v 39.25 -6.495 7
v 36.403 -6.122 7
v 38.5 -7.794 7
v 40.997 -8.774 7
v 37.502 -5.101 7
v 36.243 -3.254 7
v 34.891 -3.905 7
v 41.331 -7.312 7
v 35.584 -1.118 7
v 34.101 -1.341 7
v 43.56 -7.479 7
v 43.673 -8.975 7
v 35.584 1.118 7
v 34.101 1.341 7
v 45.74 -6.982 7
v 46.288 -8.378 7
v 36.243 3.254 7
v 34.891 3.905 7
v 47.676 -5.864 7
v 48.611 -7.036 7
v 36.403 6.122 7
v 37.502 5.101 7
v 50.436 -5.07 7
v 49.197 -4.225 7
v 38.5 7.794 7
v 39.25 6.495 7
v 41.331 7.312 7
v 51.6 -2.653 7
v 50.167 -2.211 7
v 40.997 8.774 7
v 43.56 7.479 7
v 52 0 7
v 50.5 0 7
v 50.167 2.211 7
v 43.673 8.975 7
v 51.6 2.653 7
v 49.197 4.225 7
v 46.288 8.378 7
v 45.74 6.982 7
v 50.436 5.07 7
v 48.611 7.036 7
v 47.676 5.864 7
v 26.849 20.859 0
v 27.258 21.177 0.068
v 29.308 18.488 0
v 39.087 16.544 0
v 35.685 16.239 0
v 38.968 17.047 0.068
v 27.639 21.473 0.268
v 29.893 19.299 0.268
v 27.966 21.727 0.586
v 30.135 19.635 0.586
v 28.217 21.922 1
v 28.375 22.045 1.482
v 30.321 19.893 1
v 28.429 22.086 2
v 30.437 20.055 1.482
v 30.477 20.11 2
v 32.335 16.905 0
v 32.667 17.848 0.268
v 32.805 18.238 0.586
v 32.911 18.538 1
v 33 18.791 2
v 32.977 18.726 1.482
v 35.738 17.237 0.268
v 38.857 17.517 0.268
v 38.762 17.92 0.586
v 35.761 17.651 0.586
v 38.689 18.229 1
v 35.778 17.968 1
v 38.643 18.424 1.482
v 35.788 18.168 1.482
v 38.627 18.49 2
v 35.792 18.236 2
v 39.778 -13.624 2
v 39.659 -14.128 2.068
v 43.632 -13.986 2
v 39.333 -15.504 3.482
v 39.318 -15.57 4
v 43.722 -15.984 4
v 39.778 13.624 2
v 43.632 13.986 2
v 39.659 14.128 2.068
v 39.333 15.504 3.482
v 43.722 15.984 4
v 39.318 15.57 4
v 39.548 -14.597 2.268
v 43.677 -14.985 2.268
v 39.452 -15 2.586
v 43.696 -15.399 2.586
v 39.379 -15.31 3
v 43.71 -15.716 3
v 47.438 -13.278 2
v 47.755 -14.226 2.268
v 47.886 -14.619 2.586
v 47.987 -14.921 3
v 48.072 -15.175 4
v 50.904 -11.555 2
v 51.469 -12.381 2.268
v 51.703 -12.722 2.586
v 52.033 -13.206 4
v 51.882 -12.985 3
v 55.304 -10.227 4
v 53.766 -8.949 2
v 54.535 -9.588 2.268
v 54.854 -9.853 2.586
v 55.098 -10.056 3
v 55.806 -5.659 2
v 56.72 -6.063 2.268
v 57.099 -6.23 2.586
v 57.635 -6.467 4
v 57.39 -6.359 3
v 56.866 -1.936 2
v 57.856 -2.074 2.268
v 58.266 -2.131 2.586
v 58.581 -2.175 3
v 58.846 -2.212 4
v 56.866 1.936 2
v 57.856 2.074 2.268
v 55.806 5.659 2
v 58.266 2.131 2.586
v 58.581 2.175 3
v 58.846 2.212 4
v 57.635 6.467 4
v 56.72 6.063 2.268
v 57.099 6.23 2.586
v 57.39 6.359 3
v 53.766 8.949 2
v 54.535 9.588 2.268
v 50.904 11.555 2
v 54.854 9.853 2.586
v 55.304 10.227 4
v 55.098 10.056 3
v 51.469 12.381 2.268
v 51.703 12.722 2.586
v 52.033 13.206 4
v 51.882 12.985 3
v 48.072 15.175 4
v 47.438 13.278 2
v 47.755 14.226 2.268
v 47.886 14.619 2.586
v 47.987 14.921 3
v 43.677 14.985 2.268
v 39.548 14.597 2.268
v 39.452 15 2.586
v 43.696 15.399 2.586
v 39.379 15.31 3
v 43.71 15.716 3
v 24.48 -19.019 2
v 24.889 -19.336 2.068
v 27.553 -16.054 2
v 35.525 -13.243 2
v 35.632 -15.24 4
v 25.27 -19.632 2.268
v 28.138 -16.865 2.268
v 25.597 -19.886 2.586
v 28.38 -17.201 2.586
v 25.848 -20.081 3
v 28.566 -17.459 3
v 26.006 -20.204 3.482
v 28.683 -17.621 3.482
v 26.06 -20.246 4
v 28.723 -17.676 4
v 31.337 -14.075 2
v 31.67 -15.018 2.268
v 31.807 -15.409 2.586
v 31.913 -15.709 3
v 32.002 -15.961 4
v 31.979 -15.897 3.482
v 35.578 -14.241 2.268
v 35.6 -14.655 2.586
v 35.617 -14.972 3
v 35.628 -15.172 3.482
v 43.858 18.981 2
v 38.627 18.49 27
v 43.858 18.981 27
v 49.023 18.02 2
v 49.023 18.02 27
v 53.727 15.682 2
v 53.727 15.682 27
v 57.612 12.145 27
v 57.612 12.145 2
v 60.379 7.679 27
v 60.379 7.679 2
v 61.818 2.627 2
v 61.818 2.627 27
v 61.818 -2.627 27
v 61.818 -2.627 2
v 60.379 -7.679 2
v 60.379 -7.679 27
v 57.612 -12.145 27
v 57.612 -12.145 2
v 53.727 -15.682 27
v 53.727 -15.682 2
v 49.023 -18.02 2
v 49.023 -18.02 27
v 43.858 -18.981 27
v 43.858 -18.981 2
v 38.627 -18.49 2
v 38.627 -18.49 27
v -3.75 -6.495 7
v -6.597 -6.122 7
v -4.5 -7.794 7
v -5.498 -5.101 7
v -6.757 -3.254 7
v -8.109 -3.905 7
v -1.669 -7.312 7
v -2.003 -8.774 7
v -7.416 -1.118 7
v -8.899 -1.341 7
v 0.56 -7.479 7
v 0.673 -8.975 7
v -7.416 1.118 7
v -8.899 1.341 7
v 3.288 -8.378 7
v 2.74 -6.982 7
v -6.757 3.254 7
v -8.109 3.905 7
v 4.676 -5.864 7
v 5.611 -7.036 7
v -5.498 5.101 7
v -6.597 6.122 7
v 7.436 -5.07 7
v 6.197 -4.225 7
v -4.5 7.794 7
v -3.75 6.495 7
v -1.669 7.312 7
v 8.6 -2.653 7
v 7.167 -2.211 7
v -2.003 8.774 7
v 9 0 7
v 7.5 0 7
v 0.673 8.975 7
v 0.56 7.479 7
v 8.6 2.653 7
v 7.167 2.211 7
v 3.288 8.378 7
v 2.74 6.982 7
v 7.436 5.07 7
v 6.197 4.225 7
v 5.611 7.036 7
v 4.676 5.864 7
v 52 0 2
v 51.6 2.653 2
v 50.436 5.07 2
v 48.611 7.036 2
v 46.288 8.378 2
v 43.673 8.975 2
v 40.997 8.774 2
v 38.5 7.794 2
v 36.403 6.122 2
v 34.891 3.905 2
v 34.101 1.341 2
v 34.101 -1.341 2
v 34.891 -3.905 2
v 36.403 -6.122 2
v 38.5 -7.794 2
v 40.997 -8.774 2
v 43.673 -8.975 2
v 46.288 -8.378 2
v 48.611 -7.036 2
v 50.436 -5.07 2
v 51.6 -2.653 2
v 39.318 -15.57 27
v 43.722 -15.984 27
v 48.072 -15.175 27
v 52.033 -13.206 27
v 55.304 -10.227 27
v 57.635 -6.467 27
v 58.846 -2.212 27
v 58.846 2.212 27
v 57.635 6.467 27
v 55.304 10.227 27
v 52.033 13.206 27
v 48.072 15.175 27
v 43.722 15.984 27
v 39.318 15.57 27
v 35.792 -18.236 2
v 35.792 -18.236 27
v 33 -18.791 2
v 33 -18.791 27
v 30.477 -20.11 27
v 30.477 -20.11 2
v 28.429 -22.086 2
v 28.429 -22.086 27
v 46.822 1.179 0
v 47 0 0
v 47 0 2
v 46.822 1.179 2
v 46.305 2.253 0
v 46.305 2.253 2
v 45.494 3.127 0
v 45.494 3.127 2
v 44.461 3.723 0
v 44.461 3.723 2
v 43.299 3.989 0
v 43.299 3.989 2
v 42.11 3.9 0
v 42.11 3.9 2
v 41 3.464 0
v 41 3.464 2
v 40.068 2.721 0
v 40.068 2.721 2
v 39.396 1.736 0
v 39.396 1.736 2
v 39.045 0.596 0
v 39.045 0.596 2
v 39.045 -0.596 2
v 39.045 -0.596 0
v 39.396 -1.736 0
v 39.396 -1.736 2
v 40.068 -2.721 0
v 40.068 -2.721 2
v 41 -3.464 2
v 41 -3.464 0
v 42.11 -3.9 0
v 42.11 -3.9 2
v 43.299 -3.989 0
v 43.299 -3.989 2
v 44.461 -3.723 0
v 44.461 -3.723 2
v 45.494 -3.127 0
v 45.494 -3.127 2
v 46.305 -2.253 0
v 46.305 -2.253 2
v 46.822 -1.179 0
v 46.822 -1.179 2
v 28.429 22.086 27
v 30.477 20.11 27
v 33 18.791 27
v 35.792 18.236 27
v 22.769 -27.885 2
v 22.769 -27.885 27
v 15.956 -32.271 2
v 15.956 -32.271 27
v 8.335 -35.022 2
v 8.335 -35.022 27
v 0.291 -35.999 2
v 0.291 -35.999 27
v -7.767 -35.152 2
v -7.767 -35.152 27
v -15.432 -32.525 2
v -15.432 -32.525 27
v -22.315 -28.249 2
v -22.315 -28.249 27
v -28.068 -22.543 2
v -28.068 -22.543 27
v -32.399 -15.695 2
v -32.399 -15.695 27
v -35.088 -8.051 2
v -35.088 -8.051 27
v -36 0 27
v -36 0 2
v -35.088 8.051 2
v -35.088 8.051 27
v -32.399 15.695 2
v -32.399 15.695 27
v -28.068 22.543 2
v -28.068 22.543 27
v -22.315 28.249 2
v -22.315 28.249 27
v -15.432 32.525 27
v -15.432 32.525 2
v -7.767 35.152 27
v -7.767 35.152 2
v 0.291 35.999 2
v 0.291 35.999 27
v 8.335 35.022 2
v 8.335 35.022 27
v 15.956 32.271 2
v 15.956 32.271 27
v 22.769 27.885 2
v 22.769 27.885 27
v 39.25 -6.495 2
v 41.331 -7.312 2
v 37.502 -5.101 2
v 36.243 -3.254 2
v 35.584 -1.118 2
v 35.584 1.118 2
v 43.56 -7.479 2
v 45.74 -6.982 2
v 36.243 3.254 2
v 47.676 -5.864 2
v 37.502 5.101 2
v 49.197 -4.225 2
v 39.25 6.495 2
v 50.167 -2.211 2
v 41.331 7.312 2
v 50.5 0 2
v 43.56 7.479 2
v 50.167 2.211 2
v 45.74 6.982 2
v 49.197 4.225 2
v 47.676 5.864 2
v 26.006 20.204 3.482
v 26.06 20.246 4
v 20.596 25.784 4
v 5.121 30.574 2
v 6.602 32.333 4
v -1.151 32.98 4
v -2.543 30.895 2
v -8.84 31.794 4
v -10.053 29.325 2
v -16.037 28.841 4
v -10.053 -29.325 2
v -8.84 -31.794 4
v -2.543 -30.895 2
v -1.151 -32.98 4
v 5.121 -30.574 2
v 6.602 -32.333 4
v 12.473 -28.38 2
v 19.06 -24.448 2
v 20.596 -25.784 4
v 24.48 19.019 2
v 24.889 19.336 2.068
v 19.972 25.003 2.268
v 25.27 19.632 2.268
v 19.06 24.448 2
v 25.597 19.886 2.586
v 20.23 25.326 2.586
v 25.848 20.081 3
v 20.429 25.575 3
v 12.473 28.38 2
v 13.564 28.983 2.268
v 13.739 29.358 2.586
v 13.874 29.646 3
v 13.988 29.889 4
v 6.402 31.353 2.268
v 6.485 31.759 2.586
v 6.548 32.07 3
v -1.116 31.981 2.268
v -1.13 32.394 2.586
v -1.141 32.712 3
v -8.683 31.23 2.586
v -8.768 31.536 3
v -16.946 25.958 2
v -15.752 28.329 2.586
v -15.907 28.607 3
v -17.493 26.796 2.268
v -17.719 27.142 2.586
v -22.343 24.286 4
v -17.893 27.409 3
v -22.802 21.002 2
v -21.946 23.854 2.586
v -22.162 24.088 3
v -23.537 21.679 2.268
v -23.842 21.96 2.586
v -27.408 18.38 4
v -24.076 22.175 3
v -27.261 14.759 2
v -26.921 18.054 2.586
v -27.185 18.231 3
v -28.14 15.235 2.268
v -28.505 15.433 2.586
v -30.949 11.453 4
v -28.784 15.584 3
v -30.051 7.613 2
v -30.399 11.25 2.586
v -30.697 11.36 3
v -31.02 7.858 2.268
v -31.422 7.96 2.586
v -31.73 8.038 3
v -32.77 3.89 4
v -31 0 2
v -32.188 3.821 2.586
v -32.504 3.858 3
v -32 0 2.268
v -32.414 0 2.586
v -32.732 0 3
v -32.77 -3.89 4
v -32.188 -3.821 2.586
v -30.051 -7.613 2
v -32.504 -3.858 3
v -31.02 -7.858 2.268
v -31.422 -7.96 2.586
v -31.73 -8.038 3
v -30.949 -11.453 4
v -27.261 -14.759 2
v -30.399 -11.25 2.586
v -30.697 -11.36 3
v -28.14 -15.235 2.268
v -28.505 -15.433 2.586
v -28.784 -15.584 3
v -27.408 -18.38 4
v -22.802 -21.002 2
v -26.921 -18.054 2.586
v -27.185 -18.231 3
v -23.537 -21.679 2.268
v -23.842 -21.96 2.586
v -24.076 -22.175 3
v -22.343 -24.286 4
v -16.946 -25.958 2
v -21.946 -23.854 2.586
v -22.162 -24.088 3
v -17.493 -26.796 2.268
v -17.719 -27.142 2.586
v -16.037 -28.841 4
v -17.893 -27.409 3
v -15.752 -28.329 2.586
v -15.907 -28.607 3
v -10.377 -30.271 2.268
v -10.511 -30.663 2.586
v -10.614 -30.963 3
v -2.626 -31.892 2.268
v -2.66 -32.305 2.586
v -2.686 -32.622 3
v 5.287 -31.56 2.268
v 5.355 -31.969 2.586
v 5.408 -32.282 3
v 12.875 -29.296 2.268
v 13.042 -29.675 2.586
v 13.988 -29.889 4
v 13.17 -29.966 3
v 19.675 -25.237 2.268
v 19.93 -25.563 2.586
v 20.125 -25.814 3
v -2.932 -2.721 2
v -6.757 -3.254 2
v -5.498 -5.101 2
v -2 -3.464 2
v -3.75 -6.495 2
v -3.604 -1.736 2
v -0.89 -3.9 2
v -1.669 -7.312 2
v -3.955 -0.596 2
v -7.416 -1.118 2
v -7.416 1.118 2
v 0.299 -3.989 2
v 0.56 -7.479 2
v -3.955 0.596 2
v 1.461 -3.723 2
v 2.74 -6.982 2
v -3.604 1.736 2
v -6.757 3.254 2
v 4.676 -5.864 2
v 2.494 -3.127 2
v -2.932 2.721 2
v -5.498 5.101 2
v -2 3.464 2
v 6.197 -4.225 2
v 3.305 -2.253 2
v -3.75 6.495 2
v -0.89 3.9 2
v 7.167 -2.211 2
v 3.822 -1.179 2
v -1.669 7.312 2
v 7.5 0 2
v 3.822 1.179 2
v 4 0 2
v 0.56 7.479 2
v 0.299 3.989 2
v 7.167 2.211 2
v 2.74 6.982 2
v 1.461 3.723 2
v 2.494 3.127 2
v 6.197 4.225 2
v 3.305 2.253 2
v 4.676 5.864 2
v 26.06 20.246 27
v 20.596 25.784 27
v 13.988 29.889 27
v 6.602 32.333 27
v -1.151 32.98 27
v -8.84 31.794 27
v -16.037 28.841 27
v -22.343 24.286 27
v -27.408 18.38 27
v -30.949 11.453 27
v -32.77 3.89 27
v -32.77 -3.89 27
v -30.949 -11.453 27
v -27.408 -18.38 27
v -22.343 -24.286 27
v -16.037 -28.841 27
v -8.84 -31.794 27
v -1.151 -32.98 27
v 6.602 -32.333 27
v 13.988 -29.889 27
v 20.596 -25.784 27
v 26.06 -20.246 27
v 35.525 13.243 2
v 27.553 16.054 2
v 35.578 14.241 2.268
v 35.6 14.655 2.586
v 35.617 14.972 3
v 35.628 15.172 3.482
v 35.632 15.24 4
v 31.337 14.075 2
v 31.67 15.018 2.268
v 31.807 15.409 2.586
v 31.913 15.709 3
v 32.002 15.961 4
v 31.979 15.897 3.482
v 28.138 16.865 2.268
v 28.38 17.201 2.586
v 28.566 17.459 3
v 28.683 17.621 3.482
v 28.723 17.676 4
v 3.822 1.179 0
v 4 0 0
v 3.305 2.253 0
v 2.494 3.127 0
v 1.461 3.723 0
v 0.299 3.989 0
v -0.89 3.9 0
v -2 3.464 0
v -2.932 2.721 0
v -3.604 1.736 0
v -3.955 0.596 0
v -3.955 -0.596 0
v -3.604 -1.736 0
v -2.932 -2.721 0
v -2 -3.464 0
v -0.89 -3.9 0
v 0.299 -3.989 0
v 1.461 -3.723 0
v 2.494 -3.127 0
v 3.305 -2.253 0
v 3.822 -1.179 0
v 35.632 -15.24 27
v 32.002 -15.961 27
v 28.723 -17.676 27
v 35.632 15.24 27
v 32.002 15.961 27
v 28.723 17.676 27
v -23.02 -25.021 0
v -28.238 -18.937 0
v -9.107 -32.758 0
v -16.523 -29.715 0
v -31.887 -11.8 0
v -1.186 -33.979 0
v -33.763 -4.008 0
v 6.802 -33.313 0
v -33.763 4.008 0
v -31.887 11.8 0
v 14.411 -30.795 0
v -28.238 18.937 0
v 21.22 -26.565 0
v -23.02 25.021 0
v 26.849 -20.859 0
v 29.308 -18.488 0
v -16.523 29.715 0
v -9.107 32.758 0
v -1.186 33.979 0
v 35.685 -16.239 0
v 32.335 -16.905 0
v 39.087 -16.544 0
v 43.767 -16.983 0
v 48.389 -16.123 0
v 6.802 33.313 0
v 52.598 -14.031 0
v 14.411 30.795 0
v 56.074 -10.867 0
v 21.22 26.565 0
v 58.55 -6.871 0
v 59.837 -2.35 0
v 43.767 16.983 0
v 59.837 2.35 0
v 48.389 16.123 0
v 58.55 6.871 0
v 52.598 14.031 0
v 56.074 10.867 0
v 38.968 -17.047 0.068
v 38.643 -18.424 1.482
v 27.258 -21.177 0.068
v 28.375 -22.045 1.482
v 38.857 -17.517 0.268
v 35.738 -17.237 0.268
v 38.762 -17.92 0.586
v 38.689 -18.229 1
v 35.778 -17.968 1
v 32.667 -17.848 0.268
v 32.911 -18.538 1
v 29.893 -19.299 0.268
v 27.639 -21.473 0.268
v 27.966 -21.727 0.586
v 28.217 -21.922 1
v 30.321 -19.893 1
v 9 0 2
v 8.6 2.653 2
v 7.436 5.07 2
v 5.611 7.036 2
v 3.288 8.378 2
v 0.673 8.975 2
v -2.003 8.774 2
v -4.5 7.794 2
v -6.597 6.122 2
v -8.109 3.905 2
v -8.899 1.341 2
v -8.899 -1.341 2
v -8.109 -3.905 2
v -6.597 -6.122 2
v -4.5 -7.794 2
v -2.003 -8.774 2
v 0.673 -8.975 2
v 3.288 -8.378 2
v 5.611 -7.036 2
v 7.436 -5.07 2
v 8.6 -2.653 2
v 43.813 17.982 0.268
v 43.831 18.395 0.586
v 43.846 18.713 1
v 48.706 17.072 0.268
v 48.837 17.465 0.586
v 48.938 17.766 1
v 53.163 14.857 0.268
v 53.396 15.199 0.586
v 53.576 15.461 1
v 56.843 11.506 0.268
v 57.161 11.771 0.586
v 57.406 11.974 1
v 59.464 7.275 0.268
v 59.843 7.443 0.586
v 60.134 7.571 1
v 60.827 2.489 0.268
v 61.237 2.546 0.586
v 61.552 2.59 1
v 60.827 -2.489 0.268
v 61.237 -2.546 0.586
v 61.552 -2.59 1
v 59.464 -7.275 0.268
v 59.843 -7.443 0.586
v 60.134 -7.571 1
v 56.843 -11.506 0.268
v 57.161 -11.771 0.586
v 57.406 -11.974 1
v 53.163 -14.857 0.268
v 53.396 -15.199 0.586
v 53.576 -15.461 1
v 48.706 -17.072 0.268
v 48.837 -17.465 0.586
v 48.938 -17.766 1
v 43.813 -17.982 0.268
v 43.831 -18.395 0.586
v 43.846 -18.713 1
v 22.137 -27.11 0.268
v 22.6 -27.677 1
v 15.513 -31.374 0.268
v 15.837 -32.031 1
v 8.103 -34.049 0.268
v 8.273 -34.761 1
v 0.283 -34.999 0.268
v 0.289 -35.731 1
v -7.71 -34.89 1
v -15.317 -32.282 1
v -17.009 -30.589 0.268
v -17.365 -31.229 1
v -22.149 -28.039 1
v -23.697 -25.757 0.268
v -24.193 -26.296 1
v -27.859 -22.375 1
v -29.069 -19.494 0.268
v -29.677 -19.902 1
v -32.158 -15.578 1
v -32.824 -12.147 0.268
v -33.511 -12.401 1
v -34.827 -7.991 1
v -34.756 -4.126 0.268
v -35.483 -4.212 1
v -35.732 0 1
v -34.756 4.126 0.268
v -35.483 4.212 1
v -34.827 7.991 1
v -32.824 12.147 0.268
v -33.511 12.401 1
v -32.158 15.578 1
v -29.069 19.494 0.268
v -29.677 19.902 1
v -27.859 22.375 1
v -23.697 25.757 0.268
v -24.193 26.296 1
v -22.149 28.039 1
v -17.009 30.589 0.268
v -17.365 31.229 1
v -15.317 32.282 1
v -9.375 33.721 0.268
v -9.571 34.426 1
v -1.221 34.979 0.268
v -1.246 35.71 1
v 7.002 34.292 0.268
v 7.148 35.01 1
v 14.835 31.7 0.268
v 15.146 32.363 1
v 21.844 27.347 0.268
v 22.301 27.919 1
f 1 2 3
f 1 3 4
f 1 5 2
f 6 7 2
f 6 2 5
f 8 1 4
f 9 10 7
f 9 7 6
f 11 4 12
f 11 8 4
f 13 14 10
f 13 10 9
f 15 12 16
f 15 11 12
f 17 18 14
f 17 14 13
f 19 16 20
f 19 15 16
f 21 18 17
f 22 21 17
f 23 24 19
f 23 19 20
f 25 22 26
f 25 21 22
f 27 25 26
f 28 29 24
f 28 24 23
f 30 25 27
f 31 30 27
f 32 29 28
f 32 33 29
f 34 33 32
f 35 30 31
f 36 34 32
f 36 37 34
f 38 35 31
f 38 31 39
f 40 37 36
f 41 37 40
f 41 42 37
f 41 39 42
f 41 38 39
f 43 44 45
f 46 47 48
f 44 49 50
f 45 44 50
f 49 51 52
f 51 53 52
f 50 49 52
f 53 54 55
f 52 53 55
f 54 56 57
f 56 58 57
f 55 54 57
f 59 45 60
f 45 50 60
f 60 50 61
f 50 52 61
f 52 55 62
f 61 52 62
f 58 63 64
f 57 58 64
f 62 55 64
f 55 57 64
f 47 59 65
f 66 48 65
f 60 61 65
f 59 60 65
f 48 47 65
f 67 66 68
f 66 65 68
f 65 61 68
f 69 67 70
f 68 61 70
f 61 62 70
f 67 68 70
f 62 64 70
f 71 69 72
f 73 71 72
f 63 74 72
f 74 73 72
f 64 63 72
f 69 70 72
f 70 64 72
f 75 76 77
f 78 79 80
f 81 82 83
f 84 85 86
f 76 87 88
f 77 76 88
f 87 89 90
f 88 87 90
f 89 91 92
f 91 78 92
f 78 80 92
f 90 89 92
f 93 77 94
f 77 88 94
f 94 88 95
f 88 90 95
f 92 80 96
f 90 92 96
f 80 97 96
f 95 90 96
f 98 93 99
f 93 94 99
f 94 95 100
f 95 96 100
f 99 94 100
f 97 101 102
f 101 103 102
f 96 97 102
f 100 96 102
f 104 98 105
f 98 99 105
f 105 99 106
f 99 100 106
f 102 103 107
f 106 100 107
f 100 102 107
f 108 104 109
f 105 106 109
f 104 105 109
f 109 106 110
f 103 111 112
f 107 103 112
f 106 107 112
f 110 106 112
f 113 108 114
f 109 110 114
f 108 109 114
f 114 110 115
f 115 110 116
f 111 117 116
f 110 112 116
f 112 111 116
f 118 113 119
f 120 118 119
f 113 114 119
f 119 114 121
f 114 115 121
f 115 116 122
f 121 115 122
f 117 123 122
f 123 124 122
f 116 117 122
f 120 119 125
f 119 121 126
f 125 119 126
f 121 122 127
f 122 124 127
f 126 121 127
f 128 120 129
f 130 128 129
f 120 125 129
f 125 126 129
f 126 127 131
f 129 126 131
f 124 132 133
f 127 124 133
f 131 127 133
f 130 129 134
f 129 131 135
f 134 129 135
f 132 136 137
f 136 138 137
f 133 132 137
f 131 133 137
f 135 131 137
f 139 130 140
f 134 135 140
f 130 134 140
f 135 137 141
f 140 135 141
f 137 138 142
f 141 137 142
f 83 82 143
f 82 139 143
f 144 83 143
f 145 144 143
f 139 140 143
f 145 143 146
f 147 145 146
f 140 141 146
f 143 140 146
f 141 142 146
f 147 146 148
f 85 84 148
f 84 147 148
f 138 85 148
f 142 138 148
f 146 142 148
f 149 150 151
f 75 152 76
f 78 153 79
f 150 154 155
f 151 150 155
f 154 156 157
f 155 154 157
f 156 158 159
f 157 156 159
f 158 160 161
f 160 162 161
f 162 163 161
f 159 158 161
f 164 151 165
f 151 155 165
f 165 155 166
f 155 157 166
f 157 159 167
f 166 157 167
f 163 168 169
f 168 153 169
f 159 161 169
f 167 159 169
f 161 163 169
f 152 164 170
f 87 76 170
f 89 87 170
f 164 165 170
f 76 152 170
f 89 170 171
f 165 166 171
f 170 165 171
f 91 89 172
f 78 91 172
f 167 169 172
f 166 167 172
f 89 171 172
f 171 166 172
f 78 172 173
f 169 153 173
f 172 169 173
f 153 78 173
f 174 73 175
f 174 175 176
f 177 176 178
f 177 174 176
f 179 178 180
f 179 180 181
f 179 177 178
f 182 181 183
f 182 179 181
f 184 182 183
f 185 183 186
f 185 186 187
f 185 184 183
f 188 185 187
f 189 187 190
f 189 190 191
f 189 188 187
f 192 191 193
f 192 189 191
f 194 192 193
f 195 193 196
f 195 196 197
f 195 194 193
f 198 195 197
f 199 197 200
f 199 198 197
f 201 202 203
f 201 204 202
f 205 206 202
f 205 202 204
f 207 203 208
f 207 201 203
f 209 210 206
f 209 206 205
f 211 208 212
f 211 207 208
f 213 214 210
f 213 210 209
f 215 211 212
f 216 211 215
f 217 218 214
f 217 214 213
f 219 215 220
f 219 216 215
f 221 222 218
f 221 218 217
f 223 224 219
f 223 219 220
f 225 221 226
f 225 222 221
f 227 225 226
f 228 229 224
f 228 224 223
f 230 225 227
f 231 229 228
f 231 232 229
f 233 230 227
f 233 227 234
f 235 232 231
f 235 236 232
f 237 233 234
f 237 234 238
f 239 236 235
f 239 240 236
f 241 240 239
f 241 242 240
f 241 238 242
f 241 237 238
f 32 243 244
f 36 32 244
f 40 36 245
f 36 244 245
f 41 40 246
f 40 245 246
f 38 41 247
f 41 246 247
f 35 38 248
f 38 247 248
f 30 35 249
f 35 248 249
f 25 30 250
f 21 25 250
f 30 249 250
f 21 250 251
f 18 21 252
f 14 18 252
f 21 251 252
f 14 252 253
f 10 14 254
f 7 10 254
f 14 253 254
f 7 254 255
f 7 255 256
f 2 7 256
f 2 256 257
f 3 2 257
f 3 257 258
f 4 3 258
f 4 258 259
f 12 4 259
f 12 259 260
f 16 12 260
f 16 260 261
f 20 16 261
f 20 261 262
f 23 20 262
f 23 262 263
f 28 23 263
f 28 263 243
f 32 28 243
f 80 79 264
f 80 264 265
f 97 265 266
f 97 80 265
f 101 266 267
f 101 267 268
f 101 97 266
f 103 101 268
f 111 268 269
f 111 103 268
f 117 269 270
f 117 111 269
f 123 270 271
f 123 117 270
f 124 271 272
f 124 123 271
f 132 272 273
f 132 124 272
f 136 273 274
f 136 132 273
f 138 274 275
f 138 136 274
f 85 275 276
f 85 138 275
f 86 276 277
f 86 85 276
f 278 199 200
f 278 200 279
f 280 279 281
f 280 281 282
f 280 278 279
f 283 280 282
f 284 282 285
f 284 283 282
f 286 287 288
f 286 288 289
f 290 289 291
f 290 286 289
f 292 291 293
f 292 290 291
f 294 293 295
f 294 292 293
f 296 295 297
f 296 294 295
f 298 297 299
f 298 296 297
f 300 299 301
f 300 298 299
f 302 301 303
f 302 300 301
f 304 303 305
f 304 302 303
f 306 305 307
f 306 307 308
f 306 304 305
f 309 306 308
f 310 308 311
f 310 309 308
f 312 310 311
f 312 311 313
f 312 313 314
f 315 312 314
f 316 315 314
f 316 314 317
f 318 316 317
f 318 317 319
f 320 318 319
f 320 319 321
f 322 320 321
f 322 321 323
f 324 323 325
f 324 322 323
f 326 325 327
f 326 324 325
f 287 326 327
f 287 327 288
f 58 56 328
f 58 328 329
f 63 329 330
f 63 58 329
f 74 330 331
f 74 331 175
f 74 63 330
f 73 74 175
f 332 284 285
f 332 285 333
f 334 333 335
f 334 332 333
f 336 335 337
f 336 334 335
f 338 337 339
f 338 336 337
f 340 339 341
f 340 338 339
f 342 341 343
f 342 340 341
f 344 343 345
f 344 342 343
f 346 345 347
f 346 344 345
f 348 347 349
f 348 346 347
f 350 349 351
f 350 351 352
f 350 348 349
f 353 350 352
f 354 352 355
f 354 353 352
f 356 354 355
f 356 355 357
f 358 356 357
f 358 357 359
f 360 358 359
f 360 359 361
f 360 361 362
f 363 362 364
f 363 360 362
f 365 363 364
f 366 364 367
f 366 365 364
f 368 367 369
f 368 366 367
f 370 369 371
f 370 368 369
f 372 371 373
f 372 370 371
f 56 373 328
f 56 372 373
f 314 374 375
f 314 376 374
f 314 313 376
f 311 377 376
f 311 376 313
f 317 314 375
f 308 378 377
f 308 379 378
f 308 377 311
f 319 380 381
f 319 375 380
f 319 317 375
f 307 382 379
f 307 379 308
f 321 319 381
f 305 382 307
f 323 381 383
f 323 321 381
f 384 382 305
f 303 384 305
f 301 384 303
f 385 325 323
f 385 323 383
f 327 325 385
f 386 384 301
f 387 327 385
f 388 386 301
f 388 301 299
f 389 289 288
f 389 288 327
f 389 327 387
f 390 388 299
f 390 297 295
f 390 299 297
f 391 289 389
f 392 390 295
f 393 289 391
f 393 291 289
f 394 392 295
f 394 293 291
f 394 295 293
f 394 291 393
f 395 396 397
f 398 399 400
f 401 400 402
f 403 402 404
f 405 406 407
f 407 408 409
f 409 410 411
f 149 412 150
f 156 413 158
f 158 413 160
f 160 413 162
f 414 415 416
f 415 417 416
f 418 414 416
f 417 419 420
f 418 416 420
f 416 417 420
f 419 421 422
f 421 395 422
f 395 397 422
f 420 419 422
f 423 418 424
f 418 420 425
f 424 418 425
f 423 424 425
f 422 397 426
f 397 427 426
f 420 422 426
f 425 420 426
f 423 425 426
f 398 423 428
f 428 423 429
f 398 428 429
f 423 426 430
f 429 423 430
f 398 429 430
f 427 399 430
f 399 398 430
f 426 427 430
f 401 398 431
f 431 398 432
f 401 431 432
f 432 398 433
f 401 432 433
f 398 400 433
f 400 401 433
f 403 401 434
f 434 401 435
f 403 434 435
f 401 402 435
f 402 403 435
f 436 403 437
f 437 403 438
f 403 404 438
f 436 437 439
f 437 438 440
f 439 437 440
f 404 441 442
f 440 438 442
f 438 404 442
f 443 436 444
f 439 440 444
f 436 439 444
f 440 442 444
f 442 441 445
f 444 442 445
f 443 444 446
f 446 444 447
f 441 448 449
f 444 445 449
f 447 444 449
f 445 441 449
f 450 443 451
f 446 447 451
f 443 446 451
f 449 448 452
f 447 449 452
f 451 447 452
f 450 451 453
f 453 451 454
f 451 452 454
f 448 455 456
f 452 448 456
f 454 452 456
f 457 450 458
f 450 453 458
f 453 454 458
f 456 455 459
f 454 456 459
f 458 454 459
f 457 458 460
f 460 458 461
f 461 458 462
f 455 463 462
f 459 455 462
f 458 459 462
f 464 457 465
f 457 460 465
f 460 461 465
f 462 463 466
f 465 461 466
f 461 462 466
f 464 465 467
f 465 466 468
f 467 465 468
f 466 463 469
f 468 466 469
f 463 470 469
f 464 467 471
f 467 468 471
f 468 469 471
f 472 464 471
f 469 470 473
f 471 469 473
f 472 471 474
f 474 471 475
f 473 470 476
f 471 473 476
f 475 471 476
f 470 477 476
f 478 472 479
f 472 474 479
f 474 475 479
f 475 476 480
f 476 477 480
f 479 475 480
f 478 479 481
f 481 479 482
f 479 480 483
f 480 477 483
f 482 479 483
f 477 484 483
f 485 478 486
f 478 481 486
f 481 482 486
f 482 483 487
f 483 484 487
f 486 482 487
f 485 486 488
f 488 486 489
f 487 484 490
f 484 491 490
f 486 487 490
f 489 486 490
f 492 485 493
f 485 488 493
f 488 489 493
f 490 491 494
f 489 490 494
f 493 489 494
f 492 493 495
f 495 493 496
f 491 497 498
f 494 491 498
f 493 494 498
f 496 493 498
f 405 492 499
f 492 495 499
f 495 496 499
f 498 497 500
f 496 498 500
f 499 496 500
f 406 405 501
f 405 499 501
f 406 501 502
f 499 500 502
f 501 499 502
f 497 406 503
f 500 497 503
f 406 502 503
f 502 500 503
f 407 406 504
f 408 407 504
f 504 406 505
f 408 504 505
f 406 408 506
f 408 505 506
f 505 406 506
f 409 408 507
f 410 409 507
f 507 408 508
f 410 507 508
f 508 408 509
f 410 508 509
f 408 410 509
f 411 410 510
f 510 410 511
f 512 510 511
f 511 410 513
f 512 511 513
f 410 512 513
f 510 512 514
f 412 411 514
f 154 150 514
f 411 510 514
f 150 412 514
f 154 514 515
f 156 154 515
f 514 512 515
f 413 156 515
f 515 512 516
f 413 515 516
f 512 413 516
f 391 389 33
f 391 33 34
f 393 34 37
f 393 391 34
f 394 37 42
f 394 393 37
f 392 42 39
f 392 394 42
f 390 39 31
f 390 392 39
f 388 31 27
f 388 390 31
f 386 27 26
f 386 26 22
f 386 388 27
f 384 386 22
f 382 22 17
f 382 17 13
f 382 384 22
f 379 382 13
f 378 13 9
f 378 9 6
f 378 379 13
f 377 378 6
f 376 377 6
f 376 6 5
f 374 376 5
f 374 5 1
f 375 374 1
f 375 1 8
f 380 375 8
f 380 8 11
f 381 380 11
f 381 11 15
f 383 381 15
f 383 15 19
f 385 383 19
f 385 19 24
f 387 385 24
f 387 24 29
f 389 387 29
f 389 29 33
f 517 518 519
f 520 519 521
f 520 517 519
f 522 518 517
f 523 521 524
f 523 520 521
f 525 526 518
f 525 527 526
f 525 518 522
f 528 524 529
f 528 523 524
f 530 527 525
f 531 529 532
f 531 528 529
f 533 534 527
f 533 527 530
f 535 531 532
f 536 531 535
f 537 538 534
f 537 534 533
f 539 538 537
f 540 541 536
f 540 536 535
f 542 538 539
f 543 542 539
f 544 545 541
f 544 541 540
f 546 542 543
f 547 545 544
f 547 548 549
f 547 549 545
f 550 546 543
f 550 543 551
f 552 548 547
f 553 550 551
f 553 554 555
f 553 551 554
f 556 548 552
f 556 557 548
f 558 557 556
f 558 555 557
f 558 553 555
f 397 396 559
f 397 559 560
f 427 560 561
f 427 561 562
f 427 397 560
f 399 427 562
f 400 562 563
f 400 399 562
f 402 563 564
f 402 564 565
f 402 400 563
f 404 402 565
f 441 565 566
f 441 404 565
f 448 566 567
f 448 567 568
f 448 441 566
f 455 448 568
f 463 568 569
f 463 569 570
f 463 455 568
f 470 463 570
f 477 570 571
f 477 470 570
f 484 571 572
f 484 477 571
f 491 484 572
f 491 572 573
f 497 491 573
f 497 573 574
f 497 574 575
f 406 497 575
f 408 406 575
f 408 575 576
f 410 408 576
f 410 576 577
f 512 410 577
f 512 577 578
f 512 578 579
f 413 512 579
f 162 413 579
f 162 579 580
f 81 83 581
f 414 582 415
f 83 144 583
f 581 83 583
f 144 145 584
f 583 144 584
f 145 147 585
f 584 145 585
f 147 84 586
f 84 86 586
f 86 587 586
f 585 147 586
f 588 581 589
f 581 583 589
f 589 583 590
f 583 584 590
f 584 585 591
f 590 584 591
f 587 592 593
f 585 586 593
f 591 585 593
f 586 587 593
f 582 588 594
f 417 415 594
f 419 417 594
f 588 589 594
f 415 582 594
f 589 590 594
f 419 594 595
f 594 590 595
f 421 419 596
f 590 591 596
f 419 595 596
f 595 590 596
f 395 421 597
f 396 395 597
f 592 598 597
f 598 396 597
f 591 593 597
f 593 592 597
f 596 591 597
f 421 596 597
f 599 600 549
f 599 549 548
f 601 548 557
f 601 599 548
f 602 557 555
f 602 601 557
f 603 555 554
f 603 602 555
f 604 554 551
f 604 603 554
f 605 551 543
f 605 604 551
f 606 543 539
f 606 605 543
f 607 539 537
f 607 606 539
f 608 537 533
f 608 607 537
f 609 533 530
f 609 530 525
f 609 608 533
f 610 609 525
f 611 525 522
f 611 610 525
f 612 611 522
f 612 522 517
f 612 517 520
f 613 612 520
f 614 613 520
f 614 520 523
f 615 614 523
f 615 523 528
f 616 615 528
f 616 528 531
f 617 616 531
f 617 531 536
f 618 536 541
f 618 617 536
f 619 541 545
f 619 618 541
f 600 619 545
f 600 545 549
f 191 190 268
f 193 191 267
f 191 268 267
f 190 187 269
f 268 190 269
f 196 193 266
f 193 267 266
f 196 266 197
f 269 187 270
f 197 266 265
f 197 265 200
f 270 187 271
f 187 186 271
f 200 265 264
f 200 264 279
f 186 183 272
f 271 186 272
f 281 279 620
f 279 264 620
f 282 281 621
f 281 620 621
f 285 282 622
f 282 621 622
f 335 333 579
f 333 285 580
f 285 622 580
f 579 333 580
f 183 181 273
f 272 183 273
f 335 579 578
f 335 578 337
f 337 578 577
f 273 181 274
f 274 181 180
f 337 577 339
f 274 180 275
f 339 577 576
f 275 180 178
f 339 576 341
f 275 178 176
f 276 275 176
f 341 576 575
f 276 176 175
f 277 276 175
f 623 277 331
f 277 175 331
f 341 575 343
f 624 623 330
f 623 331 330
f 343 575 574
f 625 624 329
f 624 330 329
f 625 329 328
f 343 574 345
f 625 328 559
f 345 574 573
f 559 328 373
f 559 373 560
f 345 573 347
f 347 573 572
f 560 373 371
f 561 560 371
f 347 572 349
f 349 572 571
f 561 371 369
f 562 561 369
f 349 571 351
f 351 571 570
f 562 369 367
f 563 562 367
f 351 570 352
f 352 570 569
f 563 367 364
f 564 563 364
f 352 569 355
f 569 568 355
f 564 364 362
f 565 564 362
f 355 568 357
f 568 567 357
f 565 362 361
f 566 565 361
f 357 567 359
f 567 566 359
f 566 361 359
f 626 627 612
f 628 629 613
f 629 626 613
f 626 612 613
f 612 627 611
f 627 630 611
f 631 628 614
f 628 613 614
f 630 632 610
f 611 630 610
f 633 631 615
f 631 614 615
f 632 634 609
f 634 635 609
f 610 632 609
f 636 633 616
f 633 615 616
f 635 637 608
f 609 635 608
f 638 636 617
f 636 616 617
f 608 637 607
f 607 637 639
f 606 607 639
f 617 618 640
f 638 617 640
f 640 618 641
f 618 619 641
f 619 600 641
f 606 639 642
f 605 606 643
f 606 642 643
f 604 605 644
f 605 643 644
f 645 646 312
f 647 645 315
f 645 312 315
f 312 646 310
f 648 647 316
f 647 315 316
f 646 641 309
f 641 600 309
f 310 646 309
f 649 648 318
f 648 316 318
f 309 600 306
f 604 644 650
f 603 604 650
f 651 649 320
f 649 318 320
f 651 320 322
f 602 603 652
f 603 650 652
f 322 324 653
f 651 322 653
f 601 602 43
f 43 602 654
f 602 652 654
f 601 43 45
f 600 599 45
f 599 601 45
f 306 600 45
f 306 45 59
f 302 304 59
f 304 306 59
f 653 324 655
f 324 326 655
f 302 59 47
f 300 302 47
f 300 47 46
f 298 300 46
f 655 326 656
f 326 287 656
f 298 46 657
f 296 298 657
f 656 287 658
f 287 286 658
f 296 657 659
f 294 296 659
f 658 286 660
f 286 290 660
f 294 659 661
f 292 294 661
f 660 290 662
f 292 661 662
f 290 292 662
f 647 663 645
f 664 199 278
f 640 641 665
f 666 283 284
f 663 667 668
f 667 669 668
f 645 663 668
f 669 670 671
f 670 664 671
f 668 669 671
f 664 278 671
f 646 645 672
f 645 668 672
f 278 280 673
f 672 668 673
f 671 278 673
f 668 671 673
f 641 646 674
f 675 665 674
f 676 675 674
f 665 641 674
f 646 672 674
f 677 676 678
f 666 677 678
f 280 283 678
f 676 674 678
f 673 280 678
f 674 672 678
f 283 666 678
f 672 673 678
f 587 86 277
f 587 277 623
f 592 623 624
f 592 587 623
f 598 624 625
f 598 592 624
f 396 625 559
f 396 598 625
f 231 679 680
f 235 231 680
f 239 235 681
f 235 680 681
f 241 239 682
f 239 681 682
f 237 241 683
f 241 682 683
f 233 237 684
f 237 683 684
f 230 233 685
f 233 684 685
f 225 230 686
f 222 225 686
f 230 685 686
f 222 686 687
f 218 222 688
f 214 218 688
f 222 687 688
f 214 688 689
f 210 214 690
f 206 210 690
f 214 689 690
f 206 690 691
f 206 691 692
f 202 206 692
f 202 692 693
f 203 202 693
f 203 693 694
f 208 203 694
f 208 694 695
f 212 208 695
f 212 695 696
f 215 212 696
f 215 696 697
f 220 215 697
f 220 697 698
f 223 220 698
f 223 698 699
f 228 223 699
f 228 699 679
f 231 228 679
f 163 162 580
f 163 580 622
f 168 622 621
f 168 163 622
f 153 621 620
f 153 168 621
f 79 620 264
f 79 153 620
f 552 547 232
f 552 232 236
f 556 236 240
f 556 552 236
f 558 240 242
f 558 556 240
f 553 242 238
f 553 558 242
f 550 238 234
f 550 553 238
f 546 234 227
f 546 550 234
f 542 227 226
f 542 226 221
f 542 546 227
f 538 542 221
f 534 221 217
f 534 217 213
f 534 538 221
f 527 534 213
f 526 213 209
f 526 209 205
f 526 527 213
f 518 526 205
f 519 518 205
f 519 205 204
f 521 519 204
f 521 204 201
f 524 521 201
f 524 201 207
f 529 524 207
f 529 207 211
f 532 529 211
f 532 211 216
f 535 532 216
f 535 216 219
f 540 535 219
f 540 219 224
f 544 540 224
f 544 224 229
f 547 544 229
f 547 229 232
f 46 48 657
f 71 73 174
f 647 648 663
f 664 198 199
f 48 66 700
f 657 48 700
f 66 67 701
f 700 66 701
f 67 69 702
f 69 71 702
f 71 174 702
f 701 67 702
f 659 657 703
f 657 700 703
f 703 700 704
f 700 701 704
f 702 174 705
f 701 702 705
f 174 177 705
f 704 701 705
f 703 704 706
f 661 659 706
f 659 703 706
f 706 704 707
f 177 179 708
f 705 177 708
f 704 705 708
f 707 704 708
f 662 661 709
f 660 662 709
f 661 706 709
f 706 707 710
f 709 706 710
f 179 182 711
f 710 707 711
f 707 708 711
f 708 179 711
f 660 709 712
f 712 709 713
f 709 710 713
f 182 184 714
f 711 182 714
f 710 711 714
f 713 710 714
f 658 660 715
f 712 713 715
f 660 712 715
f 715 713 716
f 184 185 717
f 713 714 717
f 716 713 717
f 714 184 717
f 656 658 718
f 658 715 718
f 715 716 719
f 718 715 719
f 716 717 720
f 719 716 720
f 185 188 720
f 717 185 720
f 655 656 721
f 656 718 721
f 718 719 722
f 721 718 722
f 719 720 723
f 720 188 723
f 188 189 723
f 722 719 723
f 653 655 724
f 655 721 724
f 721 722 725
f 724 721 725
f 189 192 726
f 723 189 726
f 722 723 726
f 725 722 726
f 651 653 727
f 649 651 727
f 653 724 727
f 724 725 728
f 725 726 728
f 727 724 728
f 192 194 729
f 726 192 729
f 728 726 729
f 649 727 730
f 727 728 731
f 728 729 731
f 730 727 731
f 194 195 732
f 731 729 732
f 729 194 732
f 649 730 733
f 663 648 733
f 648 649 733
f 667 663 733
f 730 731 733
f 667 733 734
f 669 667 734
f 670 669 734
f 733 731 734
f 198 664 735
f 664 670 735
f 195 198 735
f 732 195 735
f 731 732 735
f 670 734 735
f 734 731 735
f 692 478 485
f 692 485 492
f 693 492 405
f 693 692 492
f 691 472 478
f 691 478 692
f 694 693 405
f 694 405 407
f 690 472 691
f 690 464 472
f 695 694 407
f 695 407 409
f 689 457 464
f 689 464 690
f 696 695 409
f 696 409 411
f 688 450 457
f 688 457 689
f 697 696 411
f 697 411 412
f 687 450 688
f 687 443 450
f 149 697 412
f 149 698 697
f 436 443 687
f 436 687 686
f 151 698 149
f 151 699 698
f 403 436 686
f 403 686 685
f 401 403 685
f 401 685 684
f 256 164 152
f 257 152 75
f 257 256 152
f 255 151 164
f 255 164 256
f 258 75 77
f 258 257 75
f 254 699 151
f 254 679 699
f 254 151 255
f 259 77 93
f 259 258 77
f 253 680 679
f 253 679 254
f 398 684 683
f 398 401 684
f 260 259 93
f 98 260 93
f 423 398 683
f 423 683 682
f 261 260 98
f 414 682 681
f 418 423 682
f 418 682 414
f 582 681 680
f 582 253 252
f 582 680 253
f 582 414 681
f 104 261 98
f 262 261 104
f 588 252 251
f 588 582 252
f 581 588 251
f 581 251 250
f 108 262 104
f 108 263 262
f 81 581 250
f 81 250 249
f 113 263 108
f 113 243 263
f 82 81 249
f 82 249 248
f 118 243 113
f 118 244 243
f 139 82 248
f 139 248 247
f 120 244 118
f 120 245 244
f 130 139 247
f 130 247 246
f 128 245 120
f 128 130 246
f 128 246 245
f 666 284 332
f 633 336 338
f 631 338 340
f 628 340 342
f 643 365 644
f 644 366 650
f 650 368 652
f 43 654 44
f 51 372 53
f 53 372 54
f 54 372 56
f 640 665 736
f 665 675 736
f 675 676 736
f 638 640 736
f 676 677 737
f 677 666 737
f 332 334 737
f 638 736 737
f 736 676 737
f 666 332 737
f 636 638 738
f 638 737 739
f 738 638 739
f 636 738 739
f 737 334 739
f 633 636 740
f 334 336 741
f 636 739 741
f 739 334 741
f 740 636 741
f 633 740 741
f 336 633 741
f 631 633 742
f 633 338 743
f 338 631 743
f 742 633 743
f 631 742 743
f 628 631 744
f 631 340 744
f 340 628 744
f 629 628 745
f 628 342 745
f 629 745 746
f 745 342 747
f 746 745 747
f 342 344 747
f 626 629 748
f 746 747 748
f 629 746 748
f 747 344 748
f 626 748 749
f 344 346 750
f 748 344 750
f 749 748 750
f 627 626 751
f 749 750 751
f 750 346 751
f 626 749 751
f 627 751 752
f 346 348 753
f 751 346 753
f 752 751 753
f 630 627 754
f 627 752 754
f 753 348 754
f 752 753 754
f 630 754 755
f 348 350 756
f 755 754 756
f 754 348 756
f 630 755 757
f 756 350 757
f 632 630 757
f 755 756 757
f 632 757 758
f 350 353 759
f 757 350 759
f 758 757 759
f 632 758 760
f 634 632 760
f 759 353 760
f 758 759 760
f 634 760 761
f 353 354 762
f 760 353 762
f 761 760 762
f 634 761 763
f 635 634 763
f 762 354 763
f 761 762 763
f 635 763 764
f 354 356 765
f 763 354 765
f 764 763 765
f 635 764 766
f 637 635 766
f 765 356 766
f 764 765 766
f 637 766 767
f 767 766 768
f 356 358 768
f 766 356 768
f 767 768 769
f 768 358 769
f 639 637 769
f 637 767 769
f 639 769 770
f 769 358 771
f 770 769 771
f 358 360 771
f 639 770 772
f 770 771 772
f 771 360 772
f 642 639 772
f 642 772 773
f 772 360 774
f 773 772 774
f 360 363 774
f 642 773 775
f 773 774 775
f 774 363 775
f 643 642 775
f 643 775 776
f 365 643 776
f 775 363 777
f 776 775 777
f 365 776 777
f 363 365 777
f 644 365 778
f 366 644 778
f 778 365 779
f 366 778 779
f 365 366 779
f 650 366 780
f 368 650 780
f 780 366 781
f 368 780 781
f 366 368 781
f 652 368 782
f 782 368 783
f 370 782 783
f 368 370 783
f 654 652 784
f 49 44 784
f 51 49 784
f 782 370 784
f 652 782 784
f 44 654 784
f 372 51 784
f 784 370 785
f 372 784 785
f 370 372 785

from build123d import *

# Parameters (mm, degrees)
SKETCH1_R           = 4
BOSS_EXTRUDE1_DEPTH = 2
SKETCH1_3_R         = 9
SKETCH1_3_R_2       = 7.5
BOSS_EXTRUDE2_DEPTH = 7
BOSS_EXTRUDE3_DEPTH = 27
FILLET1_R           = 2


with BuildPart() as part:
    # Sketch1 → Boss-Extrude1 (new body)
    with BuildSketch(Plane.XY):
        with BuildLine():
            ThreePointArc((38.627105052, 18.489937528), (32.999839448, 18.790712656), (28.428715875, 22.086378465))
            ThreePointArc((28.428715875, 22.086378465), (-36, 0), (28.428715875, -22.086378465))
            ThreePointArc((28.428715875, -22.086378465), (32.999839448, -18.790712656), (38.627105052, -18.489937528))
            ThreePointArc((38.627105052, -18.489937528), (62, 0), (38.627105052, 18.489937528))
        make_face()
        Circle(SKETCH1_R, mode=Mode.SUBTRACT)
        with Locations((43, 0)):
            Circle(SKETCH1_R, mode=Mode.SUBTRACT)
    extrude(amount=BOSS_EXTRUDE1_DEPTH)

    # Sketch1<3> → Boss-Extrude2 (add)
    # profile 1 of 2: a face of its own
    with BuildSketch(Plane.XY):
        Circle(SKETCH1_3_R)
        Circle(SKETCH1_3_R_2, mode=Mode.SUBTRACT)
    # profile 2 of 2: a face of its own
    with BuildSketch(Plane.XY):
        with Locations((43, 0)):
            Circle(SKETCH1_3_R)
        with Locations((43, 0)):
            Circle(SKETCH1_3_R_2, mode=Mode.SUBTRACT)
    extrude(amount=BOSS_EXTRUDE2_DEPTH)

    # Sketch1<4> → Boss-Extrude3 (add)
    with BuildSketch(Plane.XY):
        with BuildLine():
            ThreePointArc((38.627105052, 18.489937528), (32.999839448, 18.790712656), (28.428715875, 22.086378465))
            ThreePointArc((28.428715875, 22.086378465), (-36, 0), (28.428715875, -22.086378465))
            ThreePointArc((28.428715875, -22.086378465), (32.999839448, -18.790712656), (38.627105052, -18.489937528))
            ThreePointArc((38.627105052, -18.489937528), (62, 0), (38.627105052, 18.489937528))
        make_face()
        with BuildLine():
            ThreePointArc((26.059656218, -20.245846927), (-33, 0), (26.059656218, 20.245846927))
            ThreePointArc((26.059656218, 20.245846927), (32.002116864, 15.961481374), (39.317562149, 15.570473707))
            ThreePointArc((39.317562149, 15.570473707), (59, 0), (39.317562149, -15.570473707))
            ThreePointArc((39.317562149, -15.570473707), (32.002116864, -15.961481374), (26.059656218, -20.245846927))
        make_face(mode=Mode.SUBTRACT)
    extrude(amount=BOSS_EXTRUDE3_DEPTH)

    # Fillet1
    fillet1_edges = [part.edges().sort_by_distance(p)[0] for p in [
        (32.999839448, -18.790712656, 0),
        (-36, 0, 0),
        (32.999839448, 18.790712656, 0),
        (32.002116864, -15.961481374, 2),
        (59, 0, 2),
        (32.002116864, 15.961481374, 2),
        (62, 0, 0),
        (-33, 0, 2),
    ]]
    fillet(fillet1_edges, radius=FILLET1_R)


solid = part.part
